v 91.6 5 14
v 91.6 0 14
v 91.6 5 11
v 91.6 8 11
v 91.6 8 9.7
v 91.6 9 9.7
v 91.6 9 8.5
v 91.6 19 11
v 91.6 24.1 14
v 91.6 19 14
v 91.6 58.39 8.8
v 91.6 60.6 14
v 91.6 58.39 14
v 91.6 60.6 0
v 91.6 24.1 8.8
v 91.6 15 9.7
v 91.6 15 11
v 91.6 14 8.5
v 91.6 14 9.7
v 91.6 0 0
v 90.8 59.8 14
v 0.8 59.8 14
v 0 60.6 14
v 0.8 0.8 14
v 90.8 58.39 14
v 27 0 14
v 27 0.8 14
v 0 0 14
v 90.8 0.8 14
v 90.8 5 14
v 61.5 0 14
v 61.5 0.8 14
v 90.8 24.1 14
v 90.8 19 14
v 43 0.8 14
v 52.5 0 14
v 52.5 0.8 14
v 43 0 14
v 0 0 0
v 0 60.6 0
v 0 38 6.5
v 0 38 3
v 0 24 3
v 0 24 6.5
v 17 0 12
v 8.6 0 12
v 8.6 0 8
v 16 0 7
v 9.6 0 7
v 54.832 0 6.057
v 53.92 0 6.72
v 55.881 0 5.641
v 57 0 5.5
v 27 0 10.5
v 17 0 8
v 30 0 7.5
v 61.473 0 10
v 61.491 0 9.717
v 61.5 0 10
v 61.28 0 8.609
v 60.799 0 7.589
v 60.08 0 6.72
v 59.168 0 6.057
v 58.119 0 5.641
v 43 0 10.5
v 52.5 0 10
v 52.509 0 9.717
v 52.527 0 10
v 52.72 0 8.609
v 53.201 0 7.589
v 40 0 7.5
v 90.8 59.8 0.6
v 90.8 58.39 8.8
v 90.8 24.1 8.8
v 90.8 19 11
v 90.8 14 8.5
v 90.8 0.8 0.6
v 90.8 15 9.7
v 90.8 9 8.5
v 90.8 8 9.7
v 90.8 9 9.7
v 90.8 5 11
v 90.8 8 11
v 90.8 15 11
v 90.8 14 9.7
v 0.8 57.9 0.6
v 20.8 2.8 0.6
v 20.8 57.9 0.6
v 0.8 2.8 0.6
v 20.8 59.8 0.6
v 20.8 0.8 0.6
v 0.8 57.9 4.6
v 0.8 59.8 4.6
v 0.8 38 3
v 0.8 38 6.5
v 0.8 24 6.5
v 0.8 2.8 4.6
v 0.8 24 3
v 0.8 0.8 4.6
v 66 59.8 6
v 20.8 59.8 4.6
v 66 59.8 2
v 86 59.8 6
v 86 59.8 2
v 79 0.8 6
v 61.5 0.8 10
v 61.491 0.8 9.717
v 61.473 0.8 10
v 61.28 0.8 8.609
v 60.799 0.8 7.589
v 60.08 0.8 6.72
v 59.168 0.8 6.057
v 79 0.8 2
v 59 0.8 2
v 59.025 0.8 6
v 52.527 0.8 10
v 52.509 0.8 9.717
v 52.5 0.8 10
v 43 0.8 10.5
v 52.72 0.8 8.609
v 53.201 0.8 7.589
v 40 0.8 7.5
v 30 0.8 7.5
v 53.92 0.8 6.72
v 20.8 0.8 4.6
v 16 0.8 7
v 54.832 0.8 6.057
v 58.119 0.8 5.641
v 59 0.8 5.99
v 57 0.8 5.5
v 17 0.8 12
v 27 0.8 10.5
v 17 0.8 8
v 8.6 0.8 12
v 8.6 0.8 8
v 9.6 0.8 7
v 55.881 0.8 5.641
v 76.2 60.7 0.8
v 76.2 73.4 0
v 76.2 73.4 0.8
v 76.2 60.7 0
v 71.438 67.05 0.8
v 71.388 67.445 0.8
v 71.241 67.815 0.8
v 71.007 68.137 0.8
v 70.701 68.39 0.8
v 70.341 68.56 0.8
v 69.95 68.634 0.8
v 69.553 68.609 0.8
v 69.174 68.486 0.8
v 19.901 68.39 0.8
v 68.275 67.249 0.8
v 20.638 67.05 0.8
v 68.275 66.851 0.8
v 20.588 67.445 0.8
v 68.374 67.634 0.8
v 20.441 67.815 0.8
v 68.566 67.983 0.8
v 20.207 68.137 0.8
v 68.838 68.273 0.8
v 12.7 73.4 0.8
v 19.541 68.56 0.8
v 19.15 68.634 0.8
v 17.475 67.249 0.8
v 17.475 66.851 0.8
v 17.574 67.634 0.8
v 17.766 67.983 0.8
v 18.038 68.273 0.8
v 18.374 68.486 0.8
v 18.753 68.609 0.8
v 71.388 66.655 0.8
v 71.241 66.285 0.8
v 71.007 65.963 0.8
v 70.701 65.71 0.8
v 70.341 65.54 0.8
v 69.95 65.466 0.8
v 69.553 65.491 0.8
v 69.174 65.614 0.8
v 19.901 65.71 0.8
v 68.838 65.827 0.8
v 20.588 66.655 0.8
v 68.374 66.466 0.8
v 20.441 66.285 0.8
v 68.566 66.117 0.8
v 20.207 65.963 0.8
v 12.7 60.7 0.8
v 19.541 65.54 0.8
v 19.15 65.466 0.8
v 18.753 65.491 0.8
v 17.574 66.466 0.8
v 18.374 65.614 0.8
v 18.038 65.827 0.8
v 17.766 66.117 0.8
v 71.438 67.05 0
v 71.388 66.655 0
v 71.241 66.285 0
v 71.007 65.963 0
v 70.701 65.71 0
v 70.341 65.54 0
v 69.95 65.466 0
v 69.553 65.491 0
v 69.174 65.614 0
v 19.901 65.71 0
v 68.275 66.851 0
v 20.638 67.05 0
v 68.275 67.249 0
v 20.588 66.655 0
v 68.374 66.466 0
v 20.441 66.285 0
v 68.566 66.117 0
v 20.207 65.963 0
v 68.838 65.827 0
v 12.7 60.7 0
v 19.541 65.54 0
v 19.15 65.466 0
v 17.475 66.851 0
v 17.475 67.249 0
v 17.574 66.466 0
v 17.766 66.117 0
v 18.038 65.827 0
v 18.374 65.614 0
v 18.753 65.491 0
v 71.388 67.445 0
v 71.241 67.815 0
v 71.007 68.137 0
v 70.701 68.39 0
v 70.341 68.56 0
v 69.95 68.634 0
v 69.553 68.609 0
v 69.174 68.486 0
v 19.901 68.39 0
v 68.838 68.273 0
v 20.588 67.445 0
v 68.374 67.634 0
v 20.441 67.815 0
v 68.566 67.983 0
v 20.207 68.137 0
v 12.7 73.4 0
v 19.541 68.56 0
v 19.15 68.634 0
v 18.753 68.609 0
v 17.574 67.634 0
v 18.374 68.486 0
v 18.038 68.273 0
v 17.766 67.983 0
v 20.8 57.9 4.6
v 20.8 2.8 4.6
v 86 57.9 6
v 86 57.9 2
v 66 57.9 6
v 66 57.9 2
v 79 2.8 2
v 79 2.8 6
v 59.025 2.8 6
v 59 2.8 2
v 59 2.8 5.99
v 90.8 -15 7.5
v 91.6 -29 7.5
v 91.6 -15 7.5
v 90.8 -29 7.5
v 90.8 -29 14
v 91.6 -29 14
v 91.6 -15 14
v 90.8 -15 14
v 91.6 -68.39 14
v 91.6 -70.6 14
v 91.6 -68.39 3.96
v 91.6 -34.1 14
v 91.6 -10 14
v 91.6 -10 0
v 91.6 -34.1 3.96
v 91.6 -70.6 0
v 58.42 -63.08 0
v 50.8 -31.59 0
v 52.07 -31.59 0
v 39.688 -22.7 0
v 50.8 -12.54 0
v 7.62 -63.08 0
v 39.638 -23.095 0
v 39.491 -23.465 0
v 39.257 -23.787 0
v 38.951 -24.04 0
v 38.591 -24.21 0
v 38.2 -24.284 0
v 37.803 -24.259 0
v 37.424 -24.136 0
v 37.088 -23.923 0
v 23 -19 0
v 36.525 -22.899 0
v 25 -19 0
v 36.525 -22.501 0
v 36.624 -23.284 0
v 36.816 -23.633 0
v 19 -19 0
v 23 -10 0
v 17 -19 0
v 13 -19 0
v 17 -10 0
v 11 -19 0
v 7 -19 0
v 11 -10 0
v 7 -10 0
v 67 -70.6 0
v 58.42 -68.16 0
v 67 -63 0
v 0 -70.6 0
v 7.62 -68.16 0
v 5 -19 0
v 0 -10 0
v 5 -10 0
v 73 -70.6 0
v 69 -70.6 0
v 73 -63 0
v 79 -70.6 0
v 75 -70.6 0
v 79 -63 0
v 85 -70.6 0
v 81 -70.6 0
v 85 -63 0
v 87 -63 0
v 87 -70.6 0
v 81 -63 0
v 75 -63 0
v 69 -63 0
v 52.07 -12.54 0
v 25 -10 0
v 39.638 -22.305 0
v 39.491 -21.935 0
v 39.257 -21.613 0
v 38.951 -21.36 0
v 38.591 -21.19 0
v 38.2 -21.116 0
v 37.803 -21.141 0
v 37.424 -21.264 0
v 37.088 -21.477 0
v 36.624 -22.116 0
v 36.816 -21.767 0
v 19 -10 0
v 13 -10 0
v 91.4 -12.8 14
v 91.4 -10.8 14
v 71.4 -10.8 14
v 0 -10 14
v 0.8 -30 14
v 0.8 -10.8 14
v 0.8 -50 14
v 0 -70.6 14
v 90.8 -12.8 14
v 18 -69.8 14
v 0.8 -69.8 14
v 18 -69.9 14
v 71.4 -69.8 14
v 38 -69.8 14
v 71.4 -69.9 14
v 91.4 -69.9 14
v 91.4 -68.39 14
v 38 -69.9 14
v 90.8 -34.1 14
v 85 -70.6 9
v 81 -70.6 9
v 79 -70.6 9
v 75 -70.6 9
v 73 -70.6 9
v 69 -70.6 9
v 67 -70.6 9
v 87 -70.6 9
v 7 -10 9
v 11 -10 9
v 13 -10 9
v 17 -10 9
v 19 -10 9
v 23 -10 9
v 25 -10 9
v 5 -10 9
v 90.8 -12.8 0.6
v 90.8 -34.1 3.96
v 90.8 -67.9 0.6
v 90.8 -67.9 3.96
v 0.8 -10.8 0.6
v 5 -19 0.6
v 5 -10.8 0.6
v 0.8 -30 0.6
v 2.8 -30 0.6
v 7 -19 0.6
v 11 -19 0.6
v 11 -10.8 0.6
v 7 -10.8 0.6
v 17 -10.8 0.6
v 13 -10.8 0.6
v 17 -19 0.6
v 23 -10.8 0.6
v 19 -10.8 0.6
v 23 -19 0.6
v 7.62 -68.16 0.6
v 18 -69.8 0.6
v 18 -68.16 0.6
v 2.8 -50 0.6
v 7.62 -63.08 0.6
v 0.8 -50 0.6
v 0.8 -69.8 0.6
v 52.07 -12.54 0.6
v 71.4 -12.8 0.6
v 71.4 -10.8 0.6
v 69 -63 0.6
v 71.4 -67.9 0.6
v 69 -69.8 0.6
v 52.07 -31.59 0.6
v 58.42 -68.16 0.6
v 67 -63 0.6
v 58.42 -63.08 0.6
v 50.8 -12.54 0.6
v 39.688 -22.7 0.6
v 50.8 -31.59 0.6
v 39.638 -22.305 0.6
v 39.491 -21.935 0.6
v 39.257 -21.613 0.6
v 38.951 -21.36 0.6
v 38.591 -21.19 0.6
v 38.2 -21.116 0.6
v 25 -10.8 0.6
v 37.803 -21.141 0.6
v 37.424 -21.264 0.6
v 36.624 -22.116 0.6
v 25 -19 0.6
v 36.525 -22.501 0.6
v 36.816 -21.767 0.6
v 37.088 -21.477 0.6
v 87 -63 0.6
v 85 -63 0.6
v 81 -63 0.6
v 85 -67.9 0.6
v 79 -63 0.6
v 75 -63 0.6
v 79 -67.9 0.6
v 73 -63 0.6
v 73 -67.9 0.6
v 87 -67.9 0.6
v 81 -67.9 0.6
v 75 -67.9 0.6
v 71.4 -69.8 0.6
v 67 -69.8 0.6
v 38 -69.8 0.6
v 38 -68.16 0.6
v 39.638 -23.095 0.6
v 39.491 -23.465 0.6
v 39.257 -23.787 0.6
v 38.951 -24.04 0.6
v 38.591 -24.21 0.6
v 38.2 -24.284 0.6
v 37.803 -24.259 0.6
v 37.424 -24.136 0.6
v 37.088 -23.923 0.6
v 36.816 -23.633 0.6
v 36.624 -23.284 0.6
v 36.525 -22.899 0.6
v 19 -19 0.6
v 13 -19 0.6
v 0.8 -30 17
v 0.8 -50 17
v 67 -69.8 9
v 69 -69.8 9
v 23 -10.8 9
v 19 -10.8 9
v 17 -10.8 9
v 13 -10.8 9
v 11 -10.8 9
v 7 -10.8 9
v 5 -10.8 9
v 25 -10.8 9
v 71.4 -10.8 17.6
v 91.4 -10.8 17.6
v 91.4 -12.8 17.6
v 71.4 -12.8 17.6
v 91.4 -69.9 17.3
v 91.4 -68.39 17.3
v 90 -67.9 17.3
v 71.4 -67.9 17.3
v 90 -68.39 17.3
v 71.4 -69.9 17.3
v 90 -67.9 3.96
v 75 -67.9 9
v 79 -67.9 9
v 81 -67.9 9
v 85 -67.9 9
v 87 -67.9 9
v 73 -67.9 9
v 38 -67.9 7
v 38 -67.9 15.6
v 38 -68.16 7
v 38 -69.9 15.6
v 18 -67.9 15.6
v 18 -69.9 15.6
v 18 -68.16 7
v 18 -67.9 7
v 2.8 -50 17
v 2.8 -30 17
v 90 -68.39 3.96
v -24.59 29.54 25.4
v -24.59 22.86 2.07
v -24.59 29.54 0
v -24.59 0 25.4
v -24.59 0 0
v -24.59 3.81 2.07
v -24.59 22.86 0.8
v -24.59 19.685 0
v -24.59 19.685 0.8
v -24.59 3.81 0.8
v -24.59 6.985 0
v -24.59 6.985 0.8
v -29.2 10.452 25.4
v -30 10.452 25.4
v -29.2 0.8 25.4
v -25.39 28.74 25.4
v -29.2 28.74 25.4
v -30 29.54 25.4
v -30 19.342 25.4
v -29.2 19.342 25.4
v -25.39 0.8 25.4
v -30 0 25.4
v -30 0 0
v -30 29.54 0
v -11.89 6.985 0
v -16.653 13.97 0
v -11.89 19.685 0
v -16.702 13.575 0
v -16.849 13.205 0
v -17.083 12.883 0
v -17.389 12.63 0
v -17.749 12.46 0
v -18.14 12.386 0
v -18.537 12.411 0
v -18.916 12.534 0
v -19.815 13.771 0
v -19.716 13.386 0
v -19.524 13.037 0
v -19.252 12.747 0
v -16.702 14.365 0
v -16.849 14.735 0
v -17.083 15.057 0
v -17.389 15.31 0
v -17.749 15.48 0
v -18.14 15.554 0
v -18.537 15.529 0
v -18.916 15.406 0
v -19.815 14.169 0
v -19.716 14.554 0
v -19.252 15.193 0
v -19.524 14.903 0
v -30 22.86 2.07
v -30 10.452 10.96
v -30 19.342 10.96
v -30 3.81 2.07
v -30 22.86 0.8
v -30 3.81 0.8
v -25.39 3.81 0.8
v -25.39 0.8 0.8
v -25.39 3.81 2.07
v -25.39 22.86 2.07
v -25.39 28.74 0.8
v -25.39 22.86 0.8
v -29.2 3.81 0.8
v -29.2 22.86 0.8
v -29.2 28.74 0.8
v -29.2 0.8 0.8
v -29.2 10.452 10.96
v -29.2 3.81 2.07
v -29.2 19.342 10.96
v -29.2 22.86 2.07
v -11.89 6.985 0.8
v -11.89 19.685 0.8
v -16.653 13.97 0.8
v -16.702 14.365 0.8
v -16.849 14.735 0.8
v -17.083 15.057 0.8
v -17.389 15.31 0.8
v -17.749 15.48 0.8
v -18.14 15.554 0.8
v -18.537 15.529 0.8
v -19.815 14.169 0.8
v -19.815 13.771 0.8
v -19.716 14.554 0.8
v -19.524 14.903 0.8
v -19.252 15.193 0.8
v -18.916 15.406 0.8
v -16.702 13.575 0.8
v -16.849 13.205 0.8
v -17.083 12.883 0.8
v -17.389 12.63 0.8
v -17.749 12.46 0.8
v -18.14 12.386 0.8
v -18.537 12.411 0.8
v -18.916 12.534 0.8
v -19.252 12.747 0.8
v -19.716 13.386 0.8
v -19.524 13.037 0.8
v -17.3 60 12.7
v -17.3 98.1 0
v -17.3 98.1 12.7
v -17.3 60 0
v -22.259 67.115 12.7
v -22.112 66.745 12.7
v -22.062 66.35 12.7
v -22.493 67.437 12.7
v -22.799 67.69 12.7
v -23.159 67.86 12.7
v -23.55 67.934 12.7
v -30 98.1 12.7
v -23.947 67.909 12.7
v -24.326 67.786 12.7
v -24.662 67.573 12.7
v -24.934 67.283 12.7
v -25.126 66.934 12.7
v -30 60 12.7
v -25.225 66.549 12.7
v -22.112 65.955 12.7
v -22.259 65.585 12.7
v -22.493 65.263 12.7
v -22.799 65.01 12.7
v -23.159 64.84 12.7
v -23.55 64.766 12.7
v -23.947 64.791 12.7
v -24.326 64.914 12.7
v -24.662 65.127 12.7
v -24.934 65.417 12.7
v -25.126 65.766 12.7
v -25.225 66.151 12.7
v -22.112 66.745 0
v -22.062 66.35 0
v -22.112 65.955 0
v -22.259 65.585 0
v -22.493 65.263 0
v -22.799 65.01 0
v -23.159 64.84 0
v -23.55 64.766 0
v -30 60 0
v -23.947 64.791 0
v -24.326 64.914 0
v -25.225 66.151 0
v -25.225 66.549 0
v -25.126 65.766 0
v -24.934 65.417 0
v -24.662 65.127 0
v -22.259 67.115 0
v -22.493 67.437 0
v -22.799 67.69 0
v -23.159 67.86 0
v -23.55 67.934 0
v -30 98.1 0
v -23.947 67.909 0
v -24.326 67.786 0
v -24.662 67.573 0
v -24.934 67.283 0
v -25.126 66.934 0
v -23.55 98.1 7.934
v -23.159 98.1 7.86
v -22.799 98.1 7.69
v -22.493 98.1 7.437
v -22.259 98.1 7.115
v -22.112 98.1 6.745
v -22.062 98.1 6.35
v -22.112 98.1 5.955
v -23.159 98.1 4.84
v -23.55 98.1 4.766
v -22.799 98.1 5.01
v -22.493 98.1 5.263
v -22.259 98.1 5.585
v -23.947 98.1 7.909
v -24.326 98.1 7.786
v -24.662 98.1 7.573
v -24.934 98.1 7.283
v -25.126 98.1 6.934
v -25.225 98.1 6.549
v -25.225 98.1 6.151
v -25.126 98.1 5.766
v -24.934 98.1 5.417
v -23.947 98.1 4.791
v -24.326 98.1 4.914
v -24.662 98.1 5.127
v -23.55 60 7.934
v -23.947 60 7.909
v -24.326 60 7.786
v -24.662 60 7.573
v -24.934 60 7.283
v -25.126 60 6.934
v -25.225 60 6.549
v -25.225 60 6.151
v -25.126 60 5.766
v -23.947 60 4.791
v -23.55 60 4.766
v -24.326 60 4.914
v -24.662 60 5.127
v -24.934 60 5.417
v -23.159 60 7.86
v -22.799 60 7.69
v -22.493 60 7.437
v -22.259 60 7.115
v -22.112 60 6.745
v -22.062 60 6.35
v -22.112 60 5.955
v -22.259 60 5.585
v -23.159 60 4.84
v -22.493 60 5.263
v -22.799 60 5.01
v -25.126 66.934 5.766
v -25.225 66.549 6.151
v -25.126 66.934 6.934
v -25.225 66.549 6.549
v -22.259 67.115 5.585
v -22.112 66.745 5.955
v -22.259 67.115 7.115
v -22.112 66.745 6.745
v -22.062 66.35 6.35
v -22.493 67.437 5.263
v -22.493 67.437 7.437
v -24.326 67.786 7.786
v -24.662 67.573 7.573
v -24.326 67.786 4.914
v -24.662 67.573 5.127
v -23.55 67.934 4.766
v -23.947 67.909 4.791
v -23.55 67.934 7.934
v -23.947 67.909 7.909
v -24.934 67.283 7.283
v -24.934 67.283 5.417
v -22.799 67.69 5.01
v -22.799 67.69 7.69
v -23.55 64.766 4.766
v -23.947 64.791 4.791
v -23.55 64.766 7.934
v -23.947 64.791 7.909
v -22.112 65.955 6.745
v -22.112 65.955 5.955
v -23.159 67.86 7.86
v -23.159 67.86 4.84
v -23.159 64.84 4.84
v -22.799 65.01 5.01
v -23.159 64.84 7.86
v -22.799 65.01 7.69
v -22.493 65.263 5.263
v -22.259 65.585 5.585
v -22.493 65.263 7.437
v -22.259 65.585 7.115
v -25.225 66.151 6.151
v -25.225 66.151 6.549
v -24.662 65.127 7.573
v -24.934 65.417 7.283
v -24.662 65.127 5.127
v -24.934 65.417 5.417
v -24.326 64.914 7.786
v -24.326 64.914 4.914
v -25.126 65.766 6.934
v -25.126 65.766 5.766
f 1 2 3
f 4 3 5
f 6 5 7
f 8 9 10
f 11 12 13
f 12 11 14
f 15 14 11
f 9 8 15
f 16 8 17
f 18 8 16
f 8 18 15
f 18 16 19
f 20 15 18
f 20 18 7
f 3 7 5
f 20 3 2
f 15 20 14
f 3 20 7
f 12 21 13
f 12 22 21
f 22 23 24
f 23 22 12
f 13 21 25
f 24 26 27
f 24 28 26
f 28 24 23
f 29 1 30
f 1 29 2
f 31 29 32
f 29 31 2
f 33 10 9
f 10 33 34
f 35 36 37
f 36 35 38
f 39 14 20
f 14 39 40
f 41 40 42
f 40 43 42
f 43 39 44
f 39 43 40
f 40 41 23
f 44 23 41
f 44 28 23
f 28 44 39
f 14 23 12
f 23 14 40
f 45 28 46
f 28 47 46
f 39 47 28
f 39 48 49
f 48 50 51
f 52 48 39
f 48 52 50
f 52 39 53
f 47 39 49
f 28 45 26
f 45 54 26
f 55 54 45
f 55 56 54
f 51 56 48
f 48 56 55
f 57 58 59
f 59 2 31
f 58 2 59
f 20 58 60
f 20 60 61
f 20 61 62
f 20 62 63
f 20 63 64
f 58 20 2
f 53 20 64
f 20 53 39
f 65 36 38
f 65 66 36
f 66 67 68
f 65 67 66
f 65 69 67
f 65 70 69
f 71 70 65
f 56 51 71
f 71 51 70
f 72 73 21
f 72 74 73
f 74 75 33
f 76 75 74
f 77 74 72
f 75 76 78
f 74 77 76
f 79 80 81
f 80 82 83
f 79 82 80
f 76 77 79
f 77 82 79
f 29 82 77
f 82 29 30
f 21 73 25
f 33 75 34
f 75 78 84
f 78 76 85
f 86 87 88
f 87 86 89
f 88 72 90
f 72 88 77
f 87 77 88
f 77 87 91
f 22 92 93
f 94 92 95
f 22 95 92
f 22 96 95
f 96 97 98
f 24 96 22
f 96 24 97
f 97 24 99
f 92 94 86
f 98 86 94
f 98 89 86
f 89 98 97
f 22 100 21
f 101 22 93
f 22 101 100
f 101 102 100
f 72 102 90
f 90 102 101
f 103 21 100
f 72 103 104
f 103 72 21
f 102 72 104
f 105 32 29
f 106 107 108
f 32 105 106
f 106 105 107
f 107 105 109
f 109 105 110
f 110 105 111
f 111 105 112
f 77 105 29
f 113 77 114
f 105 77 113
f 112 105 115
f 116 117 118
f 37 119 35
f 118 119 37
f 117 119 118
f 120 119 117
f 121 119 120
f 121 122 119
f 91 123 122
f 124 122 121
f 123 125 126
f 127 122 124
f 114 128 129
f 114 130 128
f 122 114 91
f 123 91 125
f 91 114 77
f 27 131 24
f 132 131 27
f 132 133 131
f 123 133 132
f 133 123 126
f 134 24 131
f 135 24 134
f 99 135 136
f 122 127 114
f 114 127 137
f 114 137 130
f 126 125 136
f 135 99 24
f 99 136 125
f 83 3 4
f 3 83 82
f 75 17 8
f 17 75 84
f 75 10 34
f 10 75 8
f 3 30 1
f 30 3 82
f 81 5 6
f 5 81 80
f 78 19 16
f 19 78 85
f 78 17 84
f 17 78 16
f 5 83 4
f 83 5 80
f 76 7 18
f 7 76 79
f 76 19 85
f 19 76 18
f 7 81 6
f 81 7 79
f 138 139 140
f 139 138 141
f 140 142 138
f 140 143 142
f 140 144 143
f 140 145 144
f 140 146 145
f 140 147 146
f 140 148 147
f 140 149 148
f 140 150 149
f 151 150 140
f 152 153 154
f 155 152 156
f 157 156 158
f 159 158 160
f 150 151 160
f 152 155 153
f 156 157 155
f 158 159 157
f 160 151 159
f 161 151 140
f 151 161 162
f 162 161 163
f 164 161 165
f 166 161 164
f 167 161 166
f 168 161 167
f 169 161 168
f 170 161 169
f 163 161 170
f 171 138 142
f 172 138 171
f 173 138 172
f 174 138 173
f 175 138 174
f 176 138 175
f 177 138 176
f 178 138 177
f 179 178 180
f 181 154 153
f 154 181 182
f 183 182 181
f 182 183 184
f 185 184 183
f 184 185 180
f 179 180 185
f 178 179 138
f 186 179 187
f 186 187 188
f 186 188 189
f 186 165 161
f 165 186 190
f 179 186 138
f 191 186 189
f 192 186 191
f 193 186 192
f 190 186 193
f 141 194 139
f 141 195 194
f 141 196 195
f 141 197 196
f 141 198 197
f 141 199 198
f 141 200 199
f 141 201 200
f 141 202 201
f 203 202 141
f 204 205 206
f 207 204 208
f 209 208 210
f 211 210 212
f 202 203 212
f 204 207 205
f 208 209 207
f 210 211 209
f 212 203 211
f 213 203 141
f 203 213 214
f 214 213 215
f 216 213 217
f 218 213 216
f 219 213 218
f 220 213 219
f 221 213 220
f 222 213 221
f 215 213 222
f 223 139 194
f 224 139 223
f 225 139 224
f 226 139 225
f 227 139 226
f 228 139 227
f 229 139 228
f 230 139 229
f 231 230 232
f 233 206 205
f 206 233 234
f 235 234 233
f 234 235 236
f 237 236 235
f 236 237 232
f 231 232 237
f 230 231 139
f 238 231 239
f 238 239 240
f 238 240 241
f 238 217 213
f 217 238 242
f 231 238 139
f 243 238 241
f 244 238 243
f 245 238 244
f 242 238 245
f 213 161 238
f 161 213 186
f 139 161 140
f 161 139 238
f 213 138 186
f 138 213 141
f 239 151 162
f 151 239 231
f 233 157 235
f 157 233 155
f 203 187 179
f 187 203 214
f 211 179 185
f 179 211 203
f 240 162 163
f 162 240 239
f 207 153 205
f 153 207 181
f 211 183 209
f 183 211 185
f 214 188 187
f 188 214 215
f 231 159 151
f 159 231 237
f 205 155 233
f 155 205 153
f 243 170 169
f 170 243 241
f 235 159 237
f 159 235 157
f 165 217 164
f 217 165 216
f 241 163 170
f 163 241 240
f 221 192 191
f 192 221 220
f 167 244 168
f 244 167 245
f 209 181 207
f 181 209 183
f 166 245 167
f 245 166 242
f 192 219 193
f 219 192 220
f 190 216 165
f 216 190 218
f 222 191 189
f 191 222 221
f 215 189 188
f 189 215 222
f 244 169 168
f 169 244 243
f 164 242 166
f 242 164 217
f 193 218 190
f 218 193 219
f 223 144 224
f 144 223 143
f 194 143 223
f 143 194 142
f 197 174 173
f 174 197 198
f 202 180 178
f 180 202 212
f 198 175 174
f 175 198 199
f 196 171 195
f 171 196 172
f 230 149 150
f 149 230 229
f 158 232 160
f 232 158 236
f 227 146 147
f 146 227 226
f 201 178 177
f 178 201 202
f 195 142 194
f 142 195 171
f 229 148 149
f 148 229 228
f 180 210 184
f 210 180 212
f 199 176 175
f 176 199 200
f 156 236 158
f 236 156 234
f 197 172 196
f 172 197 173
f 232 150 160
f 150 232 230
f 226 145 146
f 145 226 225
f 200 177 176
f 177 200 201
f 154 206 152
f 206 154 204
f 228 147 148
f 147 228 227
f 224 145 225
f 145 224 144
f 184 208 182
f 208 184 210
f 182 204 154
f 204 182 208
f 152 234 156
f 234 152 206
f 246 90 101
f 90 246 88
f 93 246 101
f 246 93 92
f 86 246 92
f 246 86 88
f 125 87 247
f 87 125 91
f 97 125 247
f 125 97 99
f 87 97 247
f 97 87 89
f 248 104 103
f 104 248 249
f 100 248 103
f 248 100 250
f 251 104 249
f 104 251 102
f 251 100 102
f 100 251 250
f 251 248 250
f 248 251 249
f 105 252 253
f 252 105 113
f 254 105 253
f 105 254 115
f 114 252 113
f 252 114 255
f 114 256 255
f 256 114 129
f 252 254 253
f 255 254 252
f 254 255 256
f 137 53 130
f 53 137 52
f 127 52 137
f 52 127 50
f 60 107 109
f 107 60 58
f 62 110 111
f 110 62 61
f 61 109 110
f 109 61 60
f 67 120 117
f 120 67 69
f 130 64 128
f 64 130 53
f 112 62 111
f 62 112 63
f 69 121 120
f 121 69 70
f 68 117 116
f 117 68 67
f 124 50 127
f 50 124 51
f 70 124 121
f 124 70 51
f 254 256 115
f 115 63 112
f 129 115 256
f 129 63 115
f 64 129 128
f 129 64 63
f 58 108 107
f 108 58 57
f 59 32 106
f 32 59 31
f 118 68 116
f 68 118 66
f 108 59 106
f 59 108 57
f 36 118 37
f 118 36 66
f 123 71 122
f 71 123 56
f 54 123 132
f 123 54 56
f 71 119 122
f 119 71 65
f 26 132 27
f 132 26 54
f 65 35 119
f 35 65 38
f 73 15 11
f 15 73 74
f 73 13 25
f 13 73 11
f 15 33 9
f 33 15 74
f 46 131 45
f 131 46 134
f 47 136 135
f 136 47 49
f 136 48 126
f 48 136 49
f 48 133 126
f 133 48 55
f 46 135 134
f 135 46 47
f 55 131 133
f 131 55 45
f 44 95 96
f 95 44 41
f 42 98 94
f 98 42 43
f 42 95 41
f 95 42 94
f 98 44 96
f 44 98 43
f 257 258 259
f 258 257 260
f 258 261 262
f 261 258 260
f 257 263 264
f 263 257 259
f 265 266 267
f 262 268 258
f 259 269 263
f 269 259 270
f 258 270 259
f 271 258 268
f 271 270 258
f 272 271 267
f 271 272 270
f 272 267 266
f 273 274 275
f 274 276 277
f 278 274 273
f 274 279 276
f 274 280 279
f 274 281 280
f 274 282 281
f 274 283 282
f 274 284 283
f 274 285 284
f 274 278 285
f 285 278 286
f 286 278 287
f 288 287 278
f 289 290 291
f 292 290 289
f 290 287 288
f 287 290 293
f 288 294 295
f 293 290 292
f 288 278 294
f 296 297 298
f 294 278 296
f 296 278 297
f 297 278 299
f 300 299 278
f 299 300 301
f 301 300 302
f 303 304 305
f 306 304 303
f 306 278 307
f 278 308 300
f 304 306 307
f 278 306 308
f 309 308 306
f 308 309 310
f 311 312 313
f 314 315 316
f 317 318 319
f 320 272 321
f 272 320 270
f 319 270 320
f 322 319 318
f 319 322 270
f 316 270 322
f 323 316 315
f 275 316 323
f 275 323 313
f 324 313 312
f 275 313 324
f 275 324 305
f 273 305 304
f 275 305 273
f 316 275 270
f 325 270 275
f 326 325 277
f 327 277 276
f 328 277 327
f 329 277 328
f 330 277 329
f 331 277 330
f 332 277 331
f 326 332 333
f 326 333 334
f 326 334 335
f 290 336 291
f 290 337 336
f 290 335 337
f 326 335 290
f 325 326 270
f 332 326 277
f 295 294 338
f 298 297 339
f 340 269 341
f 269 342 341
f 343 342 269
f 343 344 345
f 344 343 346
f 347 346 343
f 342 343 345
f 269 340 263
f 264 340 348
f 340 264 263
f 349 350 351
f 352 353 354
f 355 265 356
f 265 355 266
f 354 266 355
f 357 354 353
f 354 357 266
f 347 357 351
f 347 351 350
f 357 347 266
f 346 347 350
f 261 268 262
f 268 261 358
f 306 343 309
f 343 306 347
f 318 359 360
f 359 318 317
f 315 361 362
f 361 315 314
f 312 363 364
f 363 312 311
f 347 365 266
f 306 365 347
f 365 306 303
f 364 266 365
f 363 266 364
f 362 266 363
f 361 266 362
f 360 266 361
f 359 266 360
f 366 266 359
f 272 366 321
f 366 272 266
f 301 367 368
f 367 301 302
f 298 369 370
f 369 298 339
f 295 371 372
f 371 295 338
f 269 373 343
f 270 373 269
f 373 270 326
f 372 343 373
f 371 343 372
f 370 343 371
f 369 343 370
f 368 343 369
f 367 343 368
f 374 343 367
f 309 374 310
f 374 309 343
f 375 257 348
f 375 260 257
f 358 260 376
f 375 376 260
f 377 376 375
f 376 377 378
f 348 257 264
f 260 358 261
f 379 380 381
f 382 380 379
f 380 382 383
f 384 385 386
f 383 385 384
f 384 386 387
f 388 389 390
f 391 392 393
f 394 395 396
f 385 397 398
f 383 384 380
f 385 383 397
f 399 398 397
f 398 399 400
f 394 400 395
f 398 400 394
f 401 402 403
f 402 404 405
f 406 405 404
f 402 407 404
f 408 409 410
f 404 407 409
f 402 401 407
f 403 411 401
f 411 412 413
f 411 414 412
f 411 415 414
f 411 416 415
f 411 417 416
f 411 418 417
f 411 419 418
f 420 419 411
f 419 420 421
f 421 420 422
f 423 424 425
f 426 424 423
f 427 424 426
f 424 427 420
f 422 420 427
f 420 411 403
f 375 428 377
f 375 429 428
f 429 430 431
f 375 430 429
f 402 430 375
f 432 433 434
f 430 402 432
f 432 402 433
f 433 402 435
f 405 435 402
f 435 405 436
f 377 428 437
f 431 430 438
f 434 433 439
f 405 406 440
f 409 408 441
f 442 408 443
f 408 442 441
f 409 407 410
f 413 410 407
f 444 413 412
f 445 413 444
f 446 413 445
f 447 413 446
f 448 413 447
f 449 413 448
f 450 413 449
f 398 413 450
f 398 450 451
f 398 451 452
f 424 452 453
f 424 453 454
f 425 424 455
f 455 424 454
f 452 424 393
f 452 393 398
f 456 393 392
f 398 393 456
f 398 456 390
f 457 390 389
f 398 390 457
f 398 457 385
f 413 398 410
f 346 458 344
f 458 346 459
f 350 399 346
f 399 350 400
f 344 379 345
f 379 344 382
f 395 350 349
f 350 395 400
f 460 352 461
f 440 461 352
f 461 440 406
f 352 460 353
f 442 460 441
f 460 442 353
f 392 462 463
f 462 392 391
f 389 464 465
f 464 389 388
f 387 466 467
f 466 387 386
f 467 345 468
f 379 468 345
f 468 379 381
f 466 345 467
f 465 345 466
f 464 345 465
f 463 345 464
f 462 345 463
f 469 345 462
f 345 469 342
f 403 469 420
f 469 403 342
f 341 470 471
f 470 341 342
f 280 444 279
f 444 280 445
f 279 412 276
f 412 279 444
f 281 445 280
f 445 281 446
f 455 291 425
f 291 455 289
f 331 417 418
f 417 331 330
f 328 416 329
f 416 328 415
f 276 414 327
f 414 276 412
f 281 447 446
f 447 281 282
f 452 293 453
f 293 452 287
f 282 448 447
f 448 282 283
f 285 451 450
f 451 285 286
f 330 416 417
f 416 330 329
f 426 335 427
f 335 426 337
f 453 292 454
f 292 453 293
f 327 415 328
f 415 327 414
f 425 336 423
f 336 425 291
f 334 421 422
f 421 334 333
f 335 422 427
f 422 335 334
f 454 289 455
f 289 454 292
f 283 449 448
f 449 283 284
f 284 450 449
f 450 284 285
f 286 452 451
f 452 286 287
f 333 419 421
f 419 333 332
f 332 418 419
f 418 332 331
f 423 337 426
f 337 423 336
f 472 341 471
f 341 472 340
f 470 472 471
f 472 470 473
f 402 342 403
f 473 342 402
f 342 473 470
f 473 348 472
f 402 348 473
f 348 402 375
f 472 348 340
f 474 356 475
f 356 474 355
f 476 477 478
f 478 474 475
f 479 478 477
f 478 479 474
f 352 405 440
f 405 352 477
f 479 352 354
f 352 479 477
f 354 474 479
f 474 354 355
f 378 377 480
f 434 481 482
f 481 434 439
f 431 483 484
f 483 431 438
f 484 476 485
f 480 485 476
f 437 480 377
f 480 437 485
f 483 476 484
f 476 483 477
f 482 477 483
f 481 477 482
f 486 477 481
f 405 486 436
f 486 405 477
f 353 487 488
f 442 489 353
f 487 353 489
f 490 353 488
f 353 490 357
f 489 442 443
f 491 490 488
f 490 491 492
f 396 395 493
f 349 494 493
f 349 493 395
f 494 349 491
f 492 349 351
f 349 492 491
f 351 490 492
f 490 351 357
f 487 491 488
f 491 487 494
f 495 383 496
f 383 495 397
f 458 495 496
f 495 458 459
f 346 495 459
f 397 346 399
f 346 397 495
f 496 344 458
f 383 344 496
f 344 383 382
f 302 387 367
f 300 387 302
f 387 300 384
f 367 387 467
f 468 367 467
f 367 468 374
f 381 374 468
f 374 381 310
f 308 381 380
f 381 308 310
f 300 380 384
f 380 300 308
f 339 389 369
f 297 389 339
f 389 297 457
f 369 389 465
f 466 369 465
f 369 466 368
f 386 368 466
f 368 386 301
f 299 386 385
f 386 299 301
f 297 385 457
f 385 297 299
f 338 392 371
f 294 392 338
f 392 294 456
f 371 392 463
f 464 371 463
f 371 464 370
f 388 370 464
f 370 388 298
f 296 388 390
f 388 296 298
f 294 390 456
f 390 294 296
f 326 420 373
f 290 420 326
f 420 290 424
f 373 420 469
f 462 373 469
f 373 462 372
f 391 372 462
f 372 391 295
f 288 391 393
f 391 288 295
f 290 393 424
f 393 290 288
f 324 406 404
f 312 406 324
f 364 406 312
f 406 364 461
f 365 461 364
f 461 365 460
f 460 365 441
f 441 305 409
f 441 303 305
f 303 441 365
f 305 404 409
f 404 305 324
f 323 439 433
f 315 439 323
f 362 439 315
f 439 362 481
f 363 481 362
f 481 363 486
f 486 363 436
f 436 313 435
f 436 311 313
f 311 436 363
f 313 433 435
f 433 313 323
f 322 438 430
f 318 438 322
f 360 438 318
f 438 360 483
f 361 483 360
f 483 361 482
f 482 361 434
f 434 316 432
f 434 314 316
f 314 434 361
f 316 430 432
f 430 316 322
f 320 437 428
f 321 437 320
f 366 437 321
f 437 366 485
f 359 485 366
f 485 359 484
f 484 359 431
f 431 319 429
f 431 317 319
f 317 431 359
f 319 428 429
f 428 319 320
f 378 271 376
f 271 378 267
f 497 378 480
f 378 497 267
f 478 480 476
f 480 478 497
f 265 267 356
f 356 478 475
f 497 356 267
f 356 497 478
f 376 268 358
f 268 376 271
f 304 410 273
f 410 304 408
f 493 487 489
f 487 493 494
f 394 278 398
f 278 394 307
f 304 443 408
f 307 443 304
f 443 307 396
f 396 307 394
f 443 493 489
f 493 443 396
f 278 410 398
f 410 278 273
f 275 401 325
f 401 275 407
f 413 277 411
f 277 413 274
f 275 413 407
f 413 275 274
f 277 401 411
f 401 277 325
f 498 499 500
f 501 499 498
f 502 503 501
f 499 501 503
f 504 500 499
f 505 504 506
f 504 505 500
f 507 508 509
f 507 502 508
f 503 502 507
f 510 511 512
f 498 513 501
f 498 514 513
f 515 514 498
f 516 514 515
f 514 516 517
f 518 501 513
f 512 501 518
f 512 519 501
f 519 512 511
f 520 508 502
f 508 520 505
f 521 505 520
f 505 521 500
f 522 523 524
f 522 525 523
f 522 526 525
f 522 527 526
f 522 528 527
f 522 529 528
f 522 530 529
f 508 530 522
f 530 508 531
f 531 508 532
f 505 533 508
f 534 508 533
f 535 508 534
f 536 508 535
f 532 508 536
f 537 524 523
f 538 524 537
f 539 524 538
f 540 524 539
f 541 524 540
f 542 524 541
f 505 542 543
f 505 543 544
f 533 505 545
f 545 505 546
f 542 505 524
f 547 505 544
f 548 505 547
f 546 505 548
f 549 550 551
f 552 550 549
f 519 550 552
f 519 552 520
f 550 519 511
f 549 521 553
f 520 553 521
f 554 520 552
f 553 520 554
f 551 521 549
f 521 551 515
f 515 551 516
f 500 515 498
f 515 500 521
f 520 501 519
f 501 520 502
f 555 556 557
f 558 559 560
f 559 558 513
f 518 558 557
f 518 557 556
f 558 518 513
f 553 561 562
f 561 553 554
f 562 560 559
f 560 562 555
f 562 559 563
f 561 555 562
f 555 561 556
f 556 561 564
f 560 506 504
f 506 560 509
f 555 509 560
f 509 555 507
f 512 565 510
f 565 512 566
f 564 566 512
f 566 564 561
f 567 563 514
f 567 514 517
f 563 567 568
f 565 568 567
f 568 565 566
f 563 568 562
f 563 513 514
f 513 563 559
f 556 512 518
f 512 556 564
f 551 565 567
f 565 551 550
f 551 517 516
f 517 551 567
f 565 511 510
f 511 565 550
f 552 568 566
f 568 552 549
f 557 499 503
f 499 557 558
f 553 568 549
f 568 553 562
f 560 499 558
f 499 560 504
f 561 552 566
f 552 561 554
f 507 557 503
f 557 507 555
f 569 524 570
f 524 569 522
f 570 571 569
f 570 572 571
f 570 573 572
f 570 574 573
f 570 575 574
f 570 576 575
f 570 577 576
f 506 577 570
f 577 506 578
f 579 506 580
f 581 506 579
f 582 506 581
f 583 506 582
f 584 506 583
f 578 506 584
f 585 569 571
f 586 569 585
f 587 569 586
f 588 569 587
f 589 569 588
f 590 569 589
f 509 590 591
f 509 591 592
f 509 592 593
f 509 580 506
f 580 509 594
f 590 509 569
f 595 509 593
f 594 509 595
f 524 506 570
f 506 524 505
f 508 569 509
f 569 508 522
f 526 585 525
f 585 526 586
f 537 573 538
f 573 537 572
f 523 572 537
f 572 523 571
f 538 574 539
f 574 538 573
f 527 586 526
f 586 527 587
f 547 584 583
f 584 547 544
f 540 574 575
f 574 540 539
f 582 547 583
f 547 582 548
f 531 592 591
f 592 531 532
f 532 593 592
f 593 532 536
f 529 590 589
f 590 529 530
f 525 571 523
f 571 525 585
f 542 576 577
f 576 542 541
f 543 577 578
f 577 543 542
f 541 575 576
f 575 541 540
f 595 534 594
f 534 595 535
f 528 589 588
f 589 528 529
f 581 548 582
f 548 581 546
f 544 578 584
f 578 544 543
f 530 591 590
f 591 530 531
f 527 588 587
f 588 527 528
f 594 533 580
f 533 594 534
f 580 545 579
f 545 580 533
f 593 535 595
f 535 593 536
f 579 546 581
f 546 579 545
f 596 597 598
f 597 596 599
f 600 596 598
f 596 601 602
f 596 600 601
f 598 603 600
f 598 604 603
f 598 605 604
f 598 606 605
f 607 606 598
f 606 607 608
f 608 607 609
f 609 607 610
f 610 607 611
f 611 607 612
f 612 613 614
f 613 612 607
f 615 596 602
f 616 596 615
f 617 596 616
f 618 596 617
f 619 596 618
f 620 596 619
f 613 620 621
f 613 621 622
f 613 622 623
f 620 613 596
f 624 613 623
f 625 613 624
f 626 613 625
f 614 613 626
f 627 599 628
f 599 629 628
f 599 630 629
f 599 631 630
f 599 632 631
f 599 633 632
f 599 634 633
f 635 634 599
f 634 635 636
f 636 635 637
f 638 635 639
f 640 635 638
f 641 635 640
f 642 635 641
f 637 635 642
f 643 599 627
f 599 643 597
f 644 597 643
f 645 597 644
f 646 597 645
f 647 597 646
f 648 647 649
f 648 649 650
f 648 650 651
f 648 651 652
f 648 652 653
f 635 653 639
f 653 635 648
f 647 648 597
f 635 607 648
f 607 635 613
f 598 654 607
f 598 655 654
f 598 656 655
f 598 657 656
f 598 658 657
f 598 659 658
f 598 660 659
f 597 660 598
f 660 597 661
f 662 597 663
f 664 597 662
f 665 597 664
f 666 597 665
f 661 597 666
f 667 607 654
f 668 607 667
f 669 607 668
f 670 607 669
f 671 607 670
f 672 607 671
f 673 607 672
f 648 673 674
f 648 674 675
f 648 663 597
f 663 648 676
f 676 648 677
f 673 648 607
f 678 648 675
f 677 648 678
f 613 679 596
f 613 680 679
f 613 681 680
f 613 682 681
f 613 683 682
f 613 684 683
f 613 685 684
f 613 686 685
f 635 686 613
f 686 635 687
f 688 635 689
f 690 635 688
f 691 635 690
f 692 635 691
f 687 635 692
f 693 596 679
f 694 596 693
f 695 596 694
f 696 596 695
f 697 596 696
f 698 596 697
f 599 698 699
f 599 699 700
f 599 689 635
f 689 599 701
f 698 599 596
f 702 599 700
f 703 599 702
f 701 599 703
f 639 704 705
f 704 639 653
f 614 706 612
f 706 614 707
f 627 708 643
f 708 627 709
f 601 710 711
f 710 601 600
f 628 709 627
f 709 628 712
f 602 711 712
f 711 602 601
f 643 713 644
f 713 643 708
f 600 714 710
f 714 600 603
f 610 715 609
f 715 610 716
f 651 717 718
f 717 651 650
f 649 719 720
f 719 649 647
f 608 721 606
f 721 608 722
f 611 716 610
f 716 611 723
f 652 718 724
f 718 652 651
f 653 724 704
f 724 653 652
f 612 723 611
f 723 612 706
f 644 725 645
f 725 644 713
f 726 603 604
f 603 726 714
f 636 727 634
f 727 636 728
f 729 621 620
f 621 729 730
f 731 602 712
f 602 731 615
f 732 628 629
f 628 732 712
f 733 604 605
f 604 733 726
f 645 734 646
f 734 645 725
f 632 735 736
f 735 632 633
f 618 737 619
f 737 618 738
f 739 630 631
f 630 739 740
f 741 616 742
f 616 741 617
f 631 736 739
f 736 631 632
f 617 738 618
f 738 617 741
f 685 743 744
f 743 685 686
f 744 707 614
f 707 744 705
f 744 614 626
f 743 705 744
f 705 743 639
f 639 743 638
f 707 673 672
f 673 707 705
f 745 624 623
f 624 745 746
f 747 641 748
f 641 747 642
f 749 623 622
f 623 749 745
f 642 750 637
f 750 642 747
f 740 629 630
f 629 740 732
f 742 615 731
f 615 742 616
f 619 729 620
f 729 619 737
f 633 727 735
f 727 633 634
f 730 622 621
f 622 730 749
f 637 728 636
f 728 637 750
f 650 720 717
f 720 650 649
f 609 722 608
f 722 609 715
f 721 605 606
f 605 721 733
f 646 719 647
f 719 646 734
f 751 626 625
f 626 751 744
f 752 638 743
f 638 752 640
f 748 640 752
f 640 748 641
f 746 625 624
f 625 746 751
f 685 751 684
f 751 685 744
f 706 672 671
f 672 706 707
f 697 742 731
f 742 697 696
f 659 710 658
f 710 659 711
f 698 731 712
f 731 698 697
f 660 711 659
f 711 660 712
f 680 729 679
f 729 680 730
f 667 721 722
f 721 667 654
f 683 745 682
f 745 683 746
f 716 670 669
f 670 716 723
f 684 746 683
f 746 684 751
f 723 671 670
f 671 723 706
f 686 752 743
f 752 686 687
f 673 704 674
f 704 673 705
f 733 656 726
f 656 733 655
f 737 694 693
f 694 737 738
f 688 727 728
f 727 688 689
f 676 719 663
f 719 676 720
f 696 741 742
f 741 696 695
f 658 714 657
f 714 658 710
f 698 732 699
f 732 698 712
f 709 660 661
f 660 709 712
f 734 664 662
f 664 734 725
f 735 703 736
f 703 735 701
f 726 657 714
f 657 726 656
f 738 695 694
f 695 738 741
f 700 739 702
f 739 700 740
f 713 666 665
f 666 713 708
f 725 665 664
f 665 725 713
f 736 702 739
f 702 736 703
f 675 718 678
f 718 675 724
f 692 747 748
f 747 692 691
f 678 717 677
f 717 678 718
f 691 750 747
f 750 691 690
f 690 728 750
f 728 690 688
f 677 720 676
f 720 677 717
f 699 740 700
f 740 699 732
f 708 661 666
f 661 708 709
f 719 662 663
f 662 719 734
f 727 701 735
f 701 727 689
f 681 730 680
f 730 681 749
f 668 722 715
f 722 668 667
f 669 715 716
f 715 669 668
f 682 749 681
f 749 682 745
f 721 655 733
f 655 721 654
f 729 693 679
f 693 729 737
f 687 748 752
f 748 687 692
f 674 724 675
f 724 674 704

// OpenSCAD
//based on http://www.thingiverse.com/thing:47270
//adapted for model B+

width = 61.5;
length = 90.0;
//thickness = 2;
thickness = 0.8;

floor_ceiling_thinness_fudge = 0.2;

total_height = 28;

// Raspberry PI
*translate([43.4+thickness,28.5+thickness,6.5]) {
	import("../RaspberryPi_B.stl");
}

// ----- Modules -----//

// Base box
module basebox() {
	difference() {
		//cube([length+(thickness*2),(width+(thickness*2))-2.5,14]);
		cube([length+(thickness*2),(width+(thickness*2)-2.5), total_height / 2 ]);
		translate ([thickness, thickness, thickness - floor_ceiling_thinness_fudge]) {
			cube([length,width-2.5, total_height]);
		}
	}
}
//basebox();

// Top box
module topbox() {
	translate([0,0,14]) {
		difference() {
			cube([length+(thickness*2),(width+(thickness*2))-2.5, total_height/2]);
			
			translate ([thickness, thickness, -thickness + floor_ceiling_thinness_fudge]) {
				cube([length,width-2.5,14]);
			}
		}
	}
}


// Hole - Digital
module digital() { //<-- moved for B+
  translate ([57,-0.1,10]) { //pos=70
    union() {
      rotate([-90,90,0]) cylinder(h=3,r=4.5, $fn=25);
      translate([-4.5,0,0]) cube([9,9,9]);
    }
  }
}


// Hole - HDMI
module hdmi() {
  translate ([27,-1,10.5]) {
    hull(){
      cube([16,4,4]);
      translate([3,0,-3]) cube([10,4,1]);
    }
  }
}

// Hole - Ethernet
module ethernet() {
  union() {
    translate ([length,5,11.0]) cube([5,14,9.5]);
    translate ([length,8.0,9.7]) cube([5,7,2]);
    translate ([length,9.0,8.5]) cube([5,5,2]);
  }
}


// Hole - USB
module usb() {
//	translate ([length,26.6,17.5]) cube([5,1.25 * 25.4, 0.6 * 25.4]);
//	translate ([length,26.6,8.8]) cube([5,13.1,5.5]);
//	translate ([length,44,17.5]) cube([5,13.1,5.5]); //<-- added for B+
//	translate ([length,44,8.8]) cube([5,13.1,5.5]); //<-- added for B+

   translate ([length,24.1,8.8]) cube([5,1.35 * 25.4, 0.6 * 25.4]);
}


// Hole - Power
module power() { //<-- rotated and repositioned for B+
	rotate([0,0,90]){ 
		hull() {
			translate ([-1,-17,8]) cube([4,8.4,4]);
			translate ([-1,-16,7]) cube([4,6.4,.3]);
		}
	}	
}
//power();
// Hole - SD Card
module sdcard() {
	translate ([-1,24,3]) cube([8,14,3.5]); //<-- changed for B+ sd -> microsd (28->14)
}



// Ventilation
module vents() {
  cube([2,10,10]);
  translate([6,0,0]) cube([2,10,10]);
  translate([12,0,0]) cube([2,10,10]);
  translate([18,0,0]) cube([2,10,10]);
}

// Hole - GPIO
module gpio() {
  translate([0.3*25.4,width - thickness - 0.3*25.4,21])cube([2.0*25.4, 0.2 * 25.4, 0.3 * 25.4]);
}

// Hole - Camera cable exit
module camera() {
  translate( [2.0*25.4, 0.1*25.4, 21]) cube([0.05* 25.4, 0.75 * 25.4 , 0.3 * 25.4]);
}

// Camera mounting tab
module camtab() {
  union() {
    difference() {
      cube( [(0.15 * 25.4) + (thickness * 2), (25.4 * 1.1) + (thickness*2), 25.4 * 1 ]); // outer 
      translate([thickness,thickness,thickness]) cube( [ 0.15 * 25.4, 25.4 * 1.1, 25.4 * 1 ]); // inner pocket
      translate( [0 , (0.38*25.4) + thickness, (0.4 * 25.4) + thickness]) cube( [thickness*2, .35 * 25.4, .6 * 25.4] );
      translate([0,0.15*25.4,thickness]) cube([0.3* 25.4, 0.75 * 25.4 , 0.05 * 25.4]);
    }
    difference() {
      translate([(0.15 * 25.4) + (thickness * 2 ), (0.25 * 1.1 * 25.4),0]) cube([0.5 * 25.4, 0.5 * 25.4, thickness]);
      translate([0.25*25.4 + (0.15 * 25.4) + (thickness * 2 ), 0.5 * 1.1 *25.4, 0]) cylinder(h=thickness, r=(0.0625 * 25.4), $fn=25);
    }
  }
}

// Post to be able to swivle it.
module cammountpost() {
  difference() {
    cube([ 0.5 * 25.4, 1.5* 25.4, 0.5 * 25.4]);
    translate([0.25 * 25.4, 0.25 * 25.4,0]) cylinder(h=(0.5 * 25.4), r=(1/16 * 25.4), $fn=25);
    translate([0.25 * 25.4, 1.75 * 25.4,0.25 * 25.4]) rotate([90.0,0,0]) cylinder(h=(1.85 * 25.4), r=(1/16 * 25.4), $fn=25);
  }
}


// Mounting tabs
// Two 1/8 in holes 2 inches apart (matches holes on the side of the Prusa I3v)
// Attaches to the bottom on the GPIO pin side
module mounttab() {
  difference() {
    cube([2.5 * 25.4, 0.5 * 25.4, thickness]);
    translate([0.25*25.4, 0.25*25.4, 0]) cylinder(h=thickness, r=(0.0625 * 25.4), $fn=25);
    translate([2.25*25.4, 0.25*25.4, 0]) cylinder(h=thickness, r=(0.0625 * 25.4), $fn=25);
  }
}

// Elements //

difference() {
  union() {
    difference() {
			basebox();
			ethernet();
         // Debugging hole to let you see how thick the box ends up
			//translate([1.5 * 25.4, 0.5 * 25.4, 0]) cylinder(r=(1/16 * 25.4), h=50*thickness, $fn=25);
     }
    // These are the standoffs that hold up the circuit board
    translate ([thickness, width - (2*thickness) -2, thickness - floor_ceiling_thinness_fudge]) cube([20,2,4]);
    translate ([thickness,thickness,thickness - floor_ceiling_thinness_fudge]) cube([20,2,4]);
    translate ([66, width - (2*thickness) - 2 , 2]) cube([20,2,4]);
    translate ([59,thickness,2]) cube([20,2,4]);

    translate ([ 0.5 * 25.4, width - thickness, 0 ]) mounttab();
    //translate ([ -((0.15*25.4)+(2*thickness)), -7.5, 0]) camtab(); // Moved separately
  }

	digital();
	hdmi();
	usb();
	power();
	sdcard();

}

// Use this to flip it for printing: translate([0,-10,28]) rotate([180,0,0]) 
translate([0,-10,28]) rotate([180,0,0])  difference() {
  union() {
    difference() {
      topbox();
      ethernet();
      // Hole for swivle post mounting
      translate([1.5 * 25.4, 0.5 * 25.4, total_height - (2*thickness)]) cylinder(r=(1/16 * 25.4), h=50*thickness, $fn=25);
    }
    translate ([(length-17-(2*thickness)),thickness, total_height - (thickness - floor_ceiling_thinness_fudge) - 17 ]) cube([20,2,17]);
    //translate ([18,2,9]) cube([20,2,17]);
    translate ([(length-17-(2*thickness)),width - (2*thickness) - 2,11 + floor_ceiling_thinness_fudge - 0.5]) cube([20,2,17]);
    translate ([18,width - (2 * thickness) - 2,11 + floor_ceiling_thinness_fudge + 1.2]) cube([20,2,15]);
    translate ([thickness,20,9 + 2]) cube([2,20,17]); 
  }

  //digital();
  //hdmi();
  usb();
  gpio();
  camera();
  translate([5,-1,19]) vents();
  translate([67,53,19]) vents();
}


translate([-30.0,0,0]) camtab();
translate([-30,60,0]) cammountpost();
